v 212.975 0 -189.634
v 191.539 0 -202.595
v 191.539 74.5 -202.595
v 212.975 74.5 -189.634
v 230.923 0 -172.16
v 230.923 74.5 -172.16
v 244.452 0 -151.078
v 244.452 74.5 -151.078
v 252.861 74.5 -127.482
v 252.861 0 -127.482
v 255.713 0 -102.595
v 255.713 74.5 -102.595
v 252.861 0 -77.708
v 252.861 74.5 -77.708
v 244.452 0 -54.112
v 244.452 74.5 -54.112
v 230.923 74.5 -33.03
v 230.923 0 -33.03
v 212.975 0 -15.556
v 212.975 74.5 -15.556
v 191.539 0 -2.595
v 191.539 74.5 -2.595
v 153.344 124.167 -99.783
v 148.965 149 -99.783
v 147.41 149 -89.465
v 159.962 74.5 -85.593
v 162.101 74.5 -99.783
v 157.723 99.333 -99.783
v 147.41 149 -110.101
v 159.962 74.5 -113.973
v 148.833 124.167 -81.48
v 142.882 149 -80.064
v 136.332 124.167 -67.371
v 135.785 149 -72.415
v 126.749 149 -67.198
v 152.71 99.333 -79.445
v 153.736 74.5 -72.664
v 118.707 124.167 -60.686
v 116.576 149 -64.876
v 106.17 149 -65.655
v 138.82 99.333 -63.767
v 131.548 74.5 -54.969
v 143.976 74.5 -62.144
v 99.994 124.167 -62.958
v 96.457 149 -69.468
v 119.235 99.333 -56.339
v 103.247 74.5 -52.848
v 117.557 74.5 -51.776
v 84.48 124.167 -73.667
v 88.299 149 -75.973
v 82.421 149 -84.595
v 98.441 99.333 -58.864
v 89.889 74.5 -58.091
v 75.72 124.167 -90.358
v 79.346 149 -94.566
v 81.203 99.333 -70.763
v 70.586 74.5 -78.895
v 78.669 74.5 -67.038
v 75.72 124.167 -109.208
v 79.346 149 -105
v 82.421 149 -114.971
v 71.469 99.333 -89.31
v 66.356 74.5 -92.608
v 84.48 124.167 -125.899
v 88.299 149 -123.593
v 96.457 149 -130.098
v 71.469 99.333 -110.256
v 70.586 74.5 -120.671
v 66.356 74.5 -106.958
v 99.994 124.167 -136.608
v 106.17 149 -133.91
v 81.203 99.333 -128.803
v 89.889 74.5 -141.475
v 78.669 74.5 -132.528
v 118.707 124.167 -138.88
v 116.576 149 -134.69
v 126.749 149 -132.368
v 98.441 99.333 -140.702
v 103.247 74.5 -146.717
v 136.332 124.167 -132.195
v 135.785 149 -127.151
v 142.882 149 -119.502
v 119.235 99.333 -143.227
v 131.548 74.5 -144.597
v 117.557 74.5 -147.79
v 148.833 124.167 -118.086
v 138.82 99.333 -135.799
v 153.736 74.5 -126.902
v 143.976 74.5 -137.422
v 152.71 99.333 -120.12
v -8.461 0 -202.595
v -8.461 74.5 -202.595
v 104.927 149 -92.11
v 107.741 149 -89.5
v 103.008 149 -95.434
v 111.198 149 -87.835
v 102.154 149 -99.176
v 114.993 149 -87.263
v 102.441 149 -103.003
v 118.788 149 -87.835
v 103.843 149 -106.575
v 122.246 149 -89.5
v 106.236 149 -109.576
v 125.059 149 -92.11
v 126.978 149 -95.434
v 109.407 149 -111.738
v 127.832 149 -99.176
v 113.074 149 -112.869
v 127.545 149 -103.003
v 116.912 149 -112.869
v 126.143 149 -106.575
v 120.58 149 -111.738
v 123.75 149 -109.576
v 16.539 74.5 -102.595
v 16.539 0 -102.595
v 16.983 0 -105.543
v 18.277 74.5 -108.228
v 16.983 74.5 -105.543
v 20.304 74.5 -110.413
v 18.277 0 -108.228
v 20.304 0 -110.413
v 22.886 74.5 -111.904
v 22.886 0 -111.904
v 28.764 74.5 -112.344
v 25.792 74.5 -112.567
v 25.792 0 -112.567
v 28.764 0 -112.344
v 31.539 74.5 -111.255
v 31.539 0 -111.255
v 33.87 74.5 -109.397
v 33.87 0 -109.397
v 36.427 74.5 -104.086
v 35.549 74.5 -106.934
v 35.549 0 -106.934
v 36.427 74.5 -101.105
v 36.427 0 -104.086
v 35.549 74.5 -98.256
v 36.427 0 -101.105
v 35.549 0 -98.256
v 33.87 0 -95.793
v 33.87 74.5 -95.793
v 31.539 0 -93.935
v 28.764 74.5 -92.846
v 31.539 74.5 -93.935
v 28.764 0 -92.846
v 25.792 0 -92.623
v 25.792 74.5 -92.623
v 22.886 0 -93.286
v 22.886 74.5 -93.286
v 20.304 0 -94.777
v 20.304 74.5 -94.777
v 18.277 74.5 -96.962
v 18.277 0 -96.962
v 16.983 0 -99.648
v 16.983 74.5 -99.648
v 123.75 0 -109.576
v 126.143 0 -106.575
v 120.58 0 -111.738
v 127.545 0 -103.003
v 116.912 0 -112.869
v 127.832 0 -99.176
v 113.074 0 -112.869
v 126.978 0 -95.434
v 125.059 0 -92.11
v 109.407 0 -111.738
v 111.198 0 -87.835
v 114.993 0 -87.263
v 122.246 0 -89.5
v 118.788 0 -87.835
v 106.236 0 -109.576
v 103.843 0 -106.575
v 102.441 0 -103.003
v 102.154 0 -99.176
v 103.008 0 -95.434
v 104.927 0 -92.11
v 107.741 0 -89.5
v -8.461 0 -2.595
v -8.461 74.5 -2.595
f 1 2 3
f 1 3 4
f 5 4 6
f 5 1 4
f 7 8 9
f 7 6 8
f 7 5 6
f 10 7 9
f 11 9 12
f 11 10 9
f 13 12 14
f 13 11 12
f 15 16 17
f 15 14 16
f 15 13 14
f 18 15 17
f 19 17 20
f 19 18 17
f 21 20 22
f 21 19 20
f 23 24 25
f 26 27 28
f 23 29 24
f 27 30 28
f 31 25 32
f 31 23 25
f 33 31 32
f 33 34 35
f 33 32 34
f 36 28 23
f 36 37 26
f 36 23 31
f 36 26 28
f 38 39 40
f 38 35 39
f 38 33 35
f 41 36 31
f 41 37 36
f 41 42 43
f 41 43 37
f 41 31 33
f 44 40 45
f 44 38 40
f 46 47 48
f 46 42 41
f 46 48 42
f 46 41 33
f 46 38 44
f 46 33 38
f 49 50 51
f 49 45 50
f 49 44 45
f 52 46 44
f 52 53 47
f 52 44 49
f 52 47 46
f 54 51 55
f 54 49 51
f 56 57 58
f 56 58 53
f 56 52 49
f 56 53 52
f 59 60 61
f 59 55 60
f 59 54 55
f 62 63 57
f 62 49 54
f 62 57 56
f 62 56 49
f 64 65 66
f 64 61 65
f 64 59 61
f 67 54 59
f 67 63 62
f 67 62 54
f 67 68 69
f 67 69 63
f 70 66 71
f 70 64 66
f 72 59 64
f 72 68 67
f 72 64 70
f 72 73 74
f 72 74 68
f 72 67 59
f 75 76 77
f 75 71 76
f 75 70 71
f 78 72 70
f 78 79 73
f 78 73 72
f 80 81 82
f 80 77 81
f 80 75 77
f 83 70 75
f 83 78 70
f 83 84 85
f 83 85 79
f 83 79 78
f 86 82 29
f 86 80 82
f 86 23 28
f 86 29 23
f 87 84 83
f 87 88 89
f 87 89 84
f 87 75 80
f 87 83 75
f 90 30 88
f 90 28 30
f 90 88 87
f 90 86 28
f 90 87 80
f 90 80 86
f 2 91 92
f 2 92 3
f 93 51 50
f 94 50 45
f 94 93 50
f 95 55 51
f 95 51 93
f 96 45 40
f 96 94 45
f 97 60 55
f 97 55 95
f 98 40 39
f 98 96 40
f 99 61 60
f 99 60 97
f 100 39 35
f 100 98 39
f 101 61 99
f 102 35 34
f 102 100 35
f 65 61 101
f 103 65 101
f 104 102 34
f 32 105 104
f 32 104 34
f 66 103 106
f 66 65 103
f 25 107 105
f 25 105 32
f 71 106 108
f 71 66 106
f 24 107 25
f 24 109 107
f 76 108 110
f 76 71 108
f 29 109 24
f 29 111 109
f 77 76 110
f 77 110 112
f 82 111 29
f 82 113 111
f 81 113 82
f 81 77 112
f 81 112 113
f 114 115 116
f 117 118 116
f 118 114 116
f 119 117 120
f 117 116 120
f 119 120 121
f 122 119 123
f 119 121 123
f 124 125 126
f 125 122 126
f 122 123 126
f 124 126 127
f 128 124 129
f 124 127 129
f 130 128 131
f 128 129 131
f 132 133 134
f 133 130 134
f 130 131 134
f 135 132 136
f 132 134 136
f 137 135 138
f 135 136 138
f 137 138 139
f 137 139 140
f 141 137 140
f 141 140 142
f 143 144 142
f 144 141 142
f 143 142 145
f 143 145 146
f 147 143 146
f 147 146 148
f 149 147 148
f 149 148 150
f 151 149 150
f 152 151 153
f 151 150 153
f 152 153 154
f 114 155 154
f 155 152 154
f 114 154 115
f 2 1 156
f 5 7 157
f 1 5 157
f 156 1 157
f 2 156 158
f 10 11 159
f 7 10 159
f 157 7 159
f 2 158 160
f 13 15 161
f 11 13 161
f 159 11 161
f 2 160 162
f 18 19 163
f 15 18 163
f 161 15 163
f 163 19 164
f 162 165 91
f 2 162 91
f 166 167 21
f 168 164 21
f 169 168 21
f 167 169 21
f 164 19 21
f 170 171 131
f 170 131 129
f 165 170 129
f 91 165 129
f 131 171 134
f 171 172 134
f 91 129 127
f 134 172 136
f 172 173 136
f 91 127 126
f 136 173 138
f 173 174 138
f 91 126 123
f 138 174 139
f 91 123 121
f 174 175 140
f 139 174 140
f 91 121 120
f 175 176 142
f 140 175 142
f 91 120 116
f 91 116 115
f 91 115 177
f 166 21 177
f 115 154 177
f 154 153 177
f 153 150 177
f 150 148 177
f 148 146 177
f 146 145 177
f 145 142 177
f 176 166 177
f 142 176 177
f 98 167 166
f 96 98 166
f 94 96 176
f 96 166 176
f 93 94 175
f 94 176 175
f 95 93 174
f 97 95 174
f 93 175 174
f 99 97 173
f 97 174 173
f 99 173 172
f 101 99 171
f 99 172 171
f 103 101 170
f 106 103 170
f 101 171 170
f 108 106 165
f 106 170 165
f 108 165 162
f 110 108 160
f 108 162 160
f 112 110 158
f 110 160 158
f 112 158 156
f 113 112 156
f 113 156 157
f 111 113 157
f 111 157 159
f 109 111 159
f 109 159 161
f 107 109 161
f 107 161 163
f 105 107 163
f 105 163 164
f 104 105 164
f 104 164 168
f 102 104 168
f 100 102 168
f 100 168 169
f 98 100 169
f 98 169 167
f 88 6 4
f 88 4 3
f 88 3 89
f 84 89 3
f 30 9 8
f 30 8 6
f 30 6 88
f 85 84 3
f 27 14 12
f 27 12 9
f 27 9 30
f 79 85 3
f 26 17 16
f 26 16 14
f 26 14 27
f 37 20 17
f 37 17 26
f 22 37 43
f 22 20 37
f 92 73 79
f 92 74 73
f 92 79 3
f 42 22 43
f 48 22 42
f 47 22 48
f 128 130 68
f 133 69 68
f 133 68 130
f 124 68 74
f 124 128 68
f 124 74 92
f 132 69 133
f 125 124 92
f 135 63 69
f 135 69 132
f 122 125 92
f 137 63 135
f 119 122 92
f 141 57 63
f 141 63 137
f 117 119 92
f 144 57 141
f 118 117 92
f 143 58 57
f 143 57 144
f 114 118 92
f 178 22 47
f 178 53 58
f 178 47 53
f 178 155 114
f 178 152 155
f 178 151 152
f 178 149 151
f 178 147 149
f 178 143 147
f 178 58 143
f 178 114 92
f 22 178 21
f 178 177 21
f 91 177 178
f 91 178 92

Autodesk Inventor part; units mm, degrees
ref_plane "YZ Plane" through (0, 0, 0) normal (1, 0, 0) x (0, 1, 0)
ref_plane "XZ Plane" through (0, 0, 0) normal (0, 1, 0) x (-1, 0, 0)
ref_plane "XY Plane" through (0, 0, 0) normal (0, 0, 1) x (1, 0, 0)
sketch "Szkic1" plane through (0, 0, 0) normal (0, 1, 0) x (-1, 0, 0)
  line L0 (8.460922, -2.595157) -> (8.460922, -202.595157)
  line L1 (8.460922, -202.595157) -> (-191.539078, -202.595157)
  line L2 (8.460922, -2.595157) -> (-191.539078, -2.595157)
  line L3 (8.460922, -2.595157) -> (208.460922, -2.595157) construction
  arc A0 (-191.539078, -2.595157) -> (-191.539078, -202.595157) centre (-145.713321, -102.595157) ccw
  line L4 (8.460922, -102.595157) -> (43.460922, -102.595157) construction
  circle A1 centre (-26.539078, -102.595157) radius 10
  point P0 (0, 0)
  dimension "d0" = 200
  dimension "d1" = 200
  dimension "d2" = 90
  dimension "d4" = 200
  dimension "d5" = 180
  dimension "d6" = 110
  dimension "d10" = 20
extrude "Wyciągnięcie proste1" add sketch "Szkic1" along normal blind 74.5
sketch "Szkic2" plane through (0, 74.5, 0) normal (0, 1, 0) x (1, 0, 0)
  circle A0 centre (107.96185, 52.890403) radius 34.51232
  circle A1 centre (113.959733, 99.782925) radius 48.14156
  point P0 (0, 0)
sketch "Szkic2 outline for Wyciągnięcie proste2" plane through (0, 74.5, 0) normal (0, 1, 0) x (1, 0, 0)
  circle A0 centre (113.959733, 99.782925) radius 48.14156
extrude "Wyciągnięcie proste2" add sketch "Szkic2 outline for Wyciągnięcie proste2" along normal blind 74.5 draft -10
hole "Otwór1" at (114.99325, 149, -100.1379) direction (0, -1, 0) diameter 25.75 end through all
